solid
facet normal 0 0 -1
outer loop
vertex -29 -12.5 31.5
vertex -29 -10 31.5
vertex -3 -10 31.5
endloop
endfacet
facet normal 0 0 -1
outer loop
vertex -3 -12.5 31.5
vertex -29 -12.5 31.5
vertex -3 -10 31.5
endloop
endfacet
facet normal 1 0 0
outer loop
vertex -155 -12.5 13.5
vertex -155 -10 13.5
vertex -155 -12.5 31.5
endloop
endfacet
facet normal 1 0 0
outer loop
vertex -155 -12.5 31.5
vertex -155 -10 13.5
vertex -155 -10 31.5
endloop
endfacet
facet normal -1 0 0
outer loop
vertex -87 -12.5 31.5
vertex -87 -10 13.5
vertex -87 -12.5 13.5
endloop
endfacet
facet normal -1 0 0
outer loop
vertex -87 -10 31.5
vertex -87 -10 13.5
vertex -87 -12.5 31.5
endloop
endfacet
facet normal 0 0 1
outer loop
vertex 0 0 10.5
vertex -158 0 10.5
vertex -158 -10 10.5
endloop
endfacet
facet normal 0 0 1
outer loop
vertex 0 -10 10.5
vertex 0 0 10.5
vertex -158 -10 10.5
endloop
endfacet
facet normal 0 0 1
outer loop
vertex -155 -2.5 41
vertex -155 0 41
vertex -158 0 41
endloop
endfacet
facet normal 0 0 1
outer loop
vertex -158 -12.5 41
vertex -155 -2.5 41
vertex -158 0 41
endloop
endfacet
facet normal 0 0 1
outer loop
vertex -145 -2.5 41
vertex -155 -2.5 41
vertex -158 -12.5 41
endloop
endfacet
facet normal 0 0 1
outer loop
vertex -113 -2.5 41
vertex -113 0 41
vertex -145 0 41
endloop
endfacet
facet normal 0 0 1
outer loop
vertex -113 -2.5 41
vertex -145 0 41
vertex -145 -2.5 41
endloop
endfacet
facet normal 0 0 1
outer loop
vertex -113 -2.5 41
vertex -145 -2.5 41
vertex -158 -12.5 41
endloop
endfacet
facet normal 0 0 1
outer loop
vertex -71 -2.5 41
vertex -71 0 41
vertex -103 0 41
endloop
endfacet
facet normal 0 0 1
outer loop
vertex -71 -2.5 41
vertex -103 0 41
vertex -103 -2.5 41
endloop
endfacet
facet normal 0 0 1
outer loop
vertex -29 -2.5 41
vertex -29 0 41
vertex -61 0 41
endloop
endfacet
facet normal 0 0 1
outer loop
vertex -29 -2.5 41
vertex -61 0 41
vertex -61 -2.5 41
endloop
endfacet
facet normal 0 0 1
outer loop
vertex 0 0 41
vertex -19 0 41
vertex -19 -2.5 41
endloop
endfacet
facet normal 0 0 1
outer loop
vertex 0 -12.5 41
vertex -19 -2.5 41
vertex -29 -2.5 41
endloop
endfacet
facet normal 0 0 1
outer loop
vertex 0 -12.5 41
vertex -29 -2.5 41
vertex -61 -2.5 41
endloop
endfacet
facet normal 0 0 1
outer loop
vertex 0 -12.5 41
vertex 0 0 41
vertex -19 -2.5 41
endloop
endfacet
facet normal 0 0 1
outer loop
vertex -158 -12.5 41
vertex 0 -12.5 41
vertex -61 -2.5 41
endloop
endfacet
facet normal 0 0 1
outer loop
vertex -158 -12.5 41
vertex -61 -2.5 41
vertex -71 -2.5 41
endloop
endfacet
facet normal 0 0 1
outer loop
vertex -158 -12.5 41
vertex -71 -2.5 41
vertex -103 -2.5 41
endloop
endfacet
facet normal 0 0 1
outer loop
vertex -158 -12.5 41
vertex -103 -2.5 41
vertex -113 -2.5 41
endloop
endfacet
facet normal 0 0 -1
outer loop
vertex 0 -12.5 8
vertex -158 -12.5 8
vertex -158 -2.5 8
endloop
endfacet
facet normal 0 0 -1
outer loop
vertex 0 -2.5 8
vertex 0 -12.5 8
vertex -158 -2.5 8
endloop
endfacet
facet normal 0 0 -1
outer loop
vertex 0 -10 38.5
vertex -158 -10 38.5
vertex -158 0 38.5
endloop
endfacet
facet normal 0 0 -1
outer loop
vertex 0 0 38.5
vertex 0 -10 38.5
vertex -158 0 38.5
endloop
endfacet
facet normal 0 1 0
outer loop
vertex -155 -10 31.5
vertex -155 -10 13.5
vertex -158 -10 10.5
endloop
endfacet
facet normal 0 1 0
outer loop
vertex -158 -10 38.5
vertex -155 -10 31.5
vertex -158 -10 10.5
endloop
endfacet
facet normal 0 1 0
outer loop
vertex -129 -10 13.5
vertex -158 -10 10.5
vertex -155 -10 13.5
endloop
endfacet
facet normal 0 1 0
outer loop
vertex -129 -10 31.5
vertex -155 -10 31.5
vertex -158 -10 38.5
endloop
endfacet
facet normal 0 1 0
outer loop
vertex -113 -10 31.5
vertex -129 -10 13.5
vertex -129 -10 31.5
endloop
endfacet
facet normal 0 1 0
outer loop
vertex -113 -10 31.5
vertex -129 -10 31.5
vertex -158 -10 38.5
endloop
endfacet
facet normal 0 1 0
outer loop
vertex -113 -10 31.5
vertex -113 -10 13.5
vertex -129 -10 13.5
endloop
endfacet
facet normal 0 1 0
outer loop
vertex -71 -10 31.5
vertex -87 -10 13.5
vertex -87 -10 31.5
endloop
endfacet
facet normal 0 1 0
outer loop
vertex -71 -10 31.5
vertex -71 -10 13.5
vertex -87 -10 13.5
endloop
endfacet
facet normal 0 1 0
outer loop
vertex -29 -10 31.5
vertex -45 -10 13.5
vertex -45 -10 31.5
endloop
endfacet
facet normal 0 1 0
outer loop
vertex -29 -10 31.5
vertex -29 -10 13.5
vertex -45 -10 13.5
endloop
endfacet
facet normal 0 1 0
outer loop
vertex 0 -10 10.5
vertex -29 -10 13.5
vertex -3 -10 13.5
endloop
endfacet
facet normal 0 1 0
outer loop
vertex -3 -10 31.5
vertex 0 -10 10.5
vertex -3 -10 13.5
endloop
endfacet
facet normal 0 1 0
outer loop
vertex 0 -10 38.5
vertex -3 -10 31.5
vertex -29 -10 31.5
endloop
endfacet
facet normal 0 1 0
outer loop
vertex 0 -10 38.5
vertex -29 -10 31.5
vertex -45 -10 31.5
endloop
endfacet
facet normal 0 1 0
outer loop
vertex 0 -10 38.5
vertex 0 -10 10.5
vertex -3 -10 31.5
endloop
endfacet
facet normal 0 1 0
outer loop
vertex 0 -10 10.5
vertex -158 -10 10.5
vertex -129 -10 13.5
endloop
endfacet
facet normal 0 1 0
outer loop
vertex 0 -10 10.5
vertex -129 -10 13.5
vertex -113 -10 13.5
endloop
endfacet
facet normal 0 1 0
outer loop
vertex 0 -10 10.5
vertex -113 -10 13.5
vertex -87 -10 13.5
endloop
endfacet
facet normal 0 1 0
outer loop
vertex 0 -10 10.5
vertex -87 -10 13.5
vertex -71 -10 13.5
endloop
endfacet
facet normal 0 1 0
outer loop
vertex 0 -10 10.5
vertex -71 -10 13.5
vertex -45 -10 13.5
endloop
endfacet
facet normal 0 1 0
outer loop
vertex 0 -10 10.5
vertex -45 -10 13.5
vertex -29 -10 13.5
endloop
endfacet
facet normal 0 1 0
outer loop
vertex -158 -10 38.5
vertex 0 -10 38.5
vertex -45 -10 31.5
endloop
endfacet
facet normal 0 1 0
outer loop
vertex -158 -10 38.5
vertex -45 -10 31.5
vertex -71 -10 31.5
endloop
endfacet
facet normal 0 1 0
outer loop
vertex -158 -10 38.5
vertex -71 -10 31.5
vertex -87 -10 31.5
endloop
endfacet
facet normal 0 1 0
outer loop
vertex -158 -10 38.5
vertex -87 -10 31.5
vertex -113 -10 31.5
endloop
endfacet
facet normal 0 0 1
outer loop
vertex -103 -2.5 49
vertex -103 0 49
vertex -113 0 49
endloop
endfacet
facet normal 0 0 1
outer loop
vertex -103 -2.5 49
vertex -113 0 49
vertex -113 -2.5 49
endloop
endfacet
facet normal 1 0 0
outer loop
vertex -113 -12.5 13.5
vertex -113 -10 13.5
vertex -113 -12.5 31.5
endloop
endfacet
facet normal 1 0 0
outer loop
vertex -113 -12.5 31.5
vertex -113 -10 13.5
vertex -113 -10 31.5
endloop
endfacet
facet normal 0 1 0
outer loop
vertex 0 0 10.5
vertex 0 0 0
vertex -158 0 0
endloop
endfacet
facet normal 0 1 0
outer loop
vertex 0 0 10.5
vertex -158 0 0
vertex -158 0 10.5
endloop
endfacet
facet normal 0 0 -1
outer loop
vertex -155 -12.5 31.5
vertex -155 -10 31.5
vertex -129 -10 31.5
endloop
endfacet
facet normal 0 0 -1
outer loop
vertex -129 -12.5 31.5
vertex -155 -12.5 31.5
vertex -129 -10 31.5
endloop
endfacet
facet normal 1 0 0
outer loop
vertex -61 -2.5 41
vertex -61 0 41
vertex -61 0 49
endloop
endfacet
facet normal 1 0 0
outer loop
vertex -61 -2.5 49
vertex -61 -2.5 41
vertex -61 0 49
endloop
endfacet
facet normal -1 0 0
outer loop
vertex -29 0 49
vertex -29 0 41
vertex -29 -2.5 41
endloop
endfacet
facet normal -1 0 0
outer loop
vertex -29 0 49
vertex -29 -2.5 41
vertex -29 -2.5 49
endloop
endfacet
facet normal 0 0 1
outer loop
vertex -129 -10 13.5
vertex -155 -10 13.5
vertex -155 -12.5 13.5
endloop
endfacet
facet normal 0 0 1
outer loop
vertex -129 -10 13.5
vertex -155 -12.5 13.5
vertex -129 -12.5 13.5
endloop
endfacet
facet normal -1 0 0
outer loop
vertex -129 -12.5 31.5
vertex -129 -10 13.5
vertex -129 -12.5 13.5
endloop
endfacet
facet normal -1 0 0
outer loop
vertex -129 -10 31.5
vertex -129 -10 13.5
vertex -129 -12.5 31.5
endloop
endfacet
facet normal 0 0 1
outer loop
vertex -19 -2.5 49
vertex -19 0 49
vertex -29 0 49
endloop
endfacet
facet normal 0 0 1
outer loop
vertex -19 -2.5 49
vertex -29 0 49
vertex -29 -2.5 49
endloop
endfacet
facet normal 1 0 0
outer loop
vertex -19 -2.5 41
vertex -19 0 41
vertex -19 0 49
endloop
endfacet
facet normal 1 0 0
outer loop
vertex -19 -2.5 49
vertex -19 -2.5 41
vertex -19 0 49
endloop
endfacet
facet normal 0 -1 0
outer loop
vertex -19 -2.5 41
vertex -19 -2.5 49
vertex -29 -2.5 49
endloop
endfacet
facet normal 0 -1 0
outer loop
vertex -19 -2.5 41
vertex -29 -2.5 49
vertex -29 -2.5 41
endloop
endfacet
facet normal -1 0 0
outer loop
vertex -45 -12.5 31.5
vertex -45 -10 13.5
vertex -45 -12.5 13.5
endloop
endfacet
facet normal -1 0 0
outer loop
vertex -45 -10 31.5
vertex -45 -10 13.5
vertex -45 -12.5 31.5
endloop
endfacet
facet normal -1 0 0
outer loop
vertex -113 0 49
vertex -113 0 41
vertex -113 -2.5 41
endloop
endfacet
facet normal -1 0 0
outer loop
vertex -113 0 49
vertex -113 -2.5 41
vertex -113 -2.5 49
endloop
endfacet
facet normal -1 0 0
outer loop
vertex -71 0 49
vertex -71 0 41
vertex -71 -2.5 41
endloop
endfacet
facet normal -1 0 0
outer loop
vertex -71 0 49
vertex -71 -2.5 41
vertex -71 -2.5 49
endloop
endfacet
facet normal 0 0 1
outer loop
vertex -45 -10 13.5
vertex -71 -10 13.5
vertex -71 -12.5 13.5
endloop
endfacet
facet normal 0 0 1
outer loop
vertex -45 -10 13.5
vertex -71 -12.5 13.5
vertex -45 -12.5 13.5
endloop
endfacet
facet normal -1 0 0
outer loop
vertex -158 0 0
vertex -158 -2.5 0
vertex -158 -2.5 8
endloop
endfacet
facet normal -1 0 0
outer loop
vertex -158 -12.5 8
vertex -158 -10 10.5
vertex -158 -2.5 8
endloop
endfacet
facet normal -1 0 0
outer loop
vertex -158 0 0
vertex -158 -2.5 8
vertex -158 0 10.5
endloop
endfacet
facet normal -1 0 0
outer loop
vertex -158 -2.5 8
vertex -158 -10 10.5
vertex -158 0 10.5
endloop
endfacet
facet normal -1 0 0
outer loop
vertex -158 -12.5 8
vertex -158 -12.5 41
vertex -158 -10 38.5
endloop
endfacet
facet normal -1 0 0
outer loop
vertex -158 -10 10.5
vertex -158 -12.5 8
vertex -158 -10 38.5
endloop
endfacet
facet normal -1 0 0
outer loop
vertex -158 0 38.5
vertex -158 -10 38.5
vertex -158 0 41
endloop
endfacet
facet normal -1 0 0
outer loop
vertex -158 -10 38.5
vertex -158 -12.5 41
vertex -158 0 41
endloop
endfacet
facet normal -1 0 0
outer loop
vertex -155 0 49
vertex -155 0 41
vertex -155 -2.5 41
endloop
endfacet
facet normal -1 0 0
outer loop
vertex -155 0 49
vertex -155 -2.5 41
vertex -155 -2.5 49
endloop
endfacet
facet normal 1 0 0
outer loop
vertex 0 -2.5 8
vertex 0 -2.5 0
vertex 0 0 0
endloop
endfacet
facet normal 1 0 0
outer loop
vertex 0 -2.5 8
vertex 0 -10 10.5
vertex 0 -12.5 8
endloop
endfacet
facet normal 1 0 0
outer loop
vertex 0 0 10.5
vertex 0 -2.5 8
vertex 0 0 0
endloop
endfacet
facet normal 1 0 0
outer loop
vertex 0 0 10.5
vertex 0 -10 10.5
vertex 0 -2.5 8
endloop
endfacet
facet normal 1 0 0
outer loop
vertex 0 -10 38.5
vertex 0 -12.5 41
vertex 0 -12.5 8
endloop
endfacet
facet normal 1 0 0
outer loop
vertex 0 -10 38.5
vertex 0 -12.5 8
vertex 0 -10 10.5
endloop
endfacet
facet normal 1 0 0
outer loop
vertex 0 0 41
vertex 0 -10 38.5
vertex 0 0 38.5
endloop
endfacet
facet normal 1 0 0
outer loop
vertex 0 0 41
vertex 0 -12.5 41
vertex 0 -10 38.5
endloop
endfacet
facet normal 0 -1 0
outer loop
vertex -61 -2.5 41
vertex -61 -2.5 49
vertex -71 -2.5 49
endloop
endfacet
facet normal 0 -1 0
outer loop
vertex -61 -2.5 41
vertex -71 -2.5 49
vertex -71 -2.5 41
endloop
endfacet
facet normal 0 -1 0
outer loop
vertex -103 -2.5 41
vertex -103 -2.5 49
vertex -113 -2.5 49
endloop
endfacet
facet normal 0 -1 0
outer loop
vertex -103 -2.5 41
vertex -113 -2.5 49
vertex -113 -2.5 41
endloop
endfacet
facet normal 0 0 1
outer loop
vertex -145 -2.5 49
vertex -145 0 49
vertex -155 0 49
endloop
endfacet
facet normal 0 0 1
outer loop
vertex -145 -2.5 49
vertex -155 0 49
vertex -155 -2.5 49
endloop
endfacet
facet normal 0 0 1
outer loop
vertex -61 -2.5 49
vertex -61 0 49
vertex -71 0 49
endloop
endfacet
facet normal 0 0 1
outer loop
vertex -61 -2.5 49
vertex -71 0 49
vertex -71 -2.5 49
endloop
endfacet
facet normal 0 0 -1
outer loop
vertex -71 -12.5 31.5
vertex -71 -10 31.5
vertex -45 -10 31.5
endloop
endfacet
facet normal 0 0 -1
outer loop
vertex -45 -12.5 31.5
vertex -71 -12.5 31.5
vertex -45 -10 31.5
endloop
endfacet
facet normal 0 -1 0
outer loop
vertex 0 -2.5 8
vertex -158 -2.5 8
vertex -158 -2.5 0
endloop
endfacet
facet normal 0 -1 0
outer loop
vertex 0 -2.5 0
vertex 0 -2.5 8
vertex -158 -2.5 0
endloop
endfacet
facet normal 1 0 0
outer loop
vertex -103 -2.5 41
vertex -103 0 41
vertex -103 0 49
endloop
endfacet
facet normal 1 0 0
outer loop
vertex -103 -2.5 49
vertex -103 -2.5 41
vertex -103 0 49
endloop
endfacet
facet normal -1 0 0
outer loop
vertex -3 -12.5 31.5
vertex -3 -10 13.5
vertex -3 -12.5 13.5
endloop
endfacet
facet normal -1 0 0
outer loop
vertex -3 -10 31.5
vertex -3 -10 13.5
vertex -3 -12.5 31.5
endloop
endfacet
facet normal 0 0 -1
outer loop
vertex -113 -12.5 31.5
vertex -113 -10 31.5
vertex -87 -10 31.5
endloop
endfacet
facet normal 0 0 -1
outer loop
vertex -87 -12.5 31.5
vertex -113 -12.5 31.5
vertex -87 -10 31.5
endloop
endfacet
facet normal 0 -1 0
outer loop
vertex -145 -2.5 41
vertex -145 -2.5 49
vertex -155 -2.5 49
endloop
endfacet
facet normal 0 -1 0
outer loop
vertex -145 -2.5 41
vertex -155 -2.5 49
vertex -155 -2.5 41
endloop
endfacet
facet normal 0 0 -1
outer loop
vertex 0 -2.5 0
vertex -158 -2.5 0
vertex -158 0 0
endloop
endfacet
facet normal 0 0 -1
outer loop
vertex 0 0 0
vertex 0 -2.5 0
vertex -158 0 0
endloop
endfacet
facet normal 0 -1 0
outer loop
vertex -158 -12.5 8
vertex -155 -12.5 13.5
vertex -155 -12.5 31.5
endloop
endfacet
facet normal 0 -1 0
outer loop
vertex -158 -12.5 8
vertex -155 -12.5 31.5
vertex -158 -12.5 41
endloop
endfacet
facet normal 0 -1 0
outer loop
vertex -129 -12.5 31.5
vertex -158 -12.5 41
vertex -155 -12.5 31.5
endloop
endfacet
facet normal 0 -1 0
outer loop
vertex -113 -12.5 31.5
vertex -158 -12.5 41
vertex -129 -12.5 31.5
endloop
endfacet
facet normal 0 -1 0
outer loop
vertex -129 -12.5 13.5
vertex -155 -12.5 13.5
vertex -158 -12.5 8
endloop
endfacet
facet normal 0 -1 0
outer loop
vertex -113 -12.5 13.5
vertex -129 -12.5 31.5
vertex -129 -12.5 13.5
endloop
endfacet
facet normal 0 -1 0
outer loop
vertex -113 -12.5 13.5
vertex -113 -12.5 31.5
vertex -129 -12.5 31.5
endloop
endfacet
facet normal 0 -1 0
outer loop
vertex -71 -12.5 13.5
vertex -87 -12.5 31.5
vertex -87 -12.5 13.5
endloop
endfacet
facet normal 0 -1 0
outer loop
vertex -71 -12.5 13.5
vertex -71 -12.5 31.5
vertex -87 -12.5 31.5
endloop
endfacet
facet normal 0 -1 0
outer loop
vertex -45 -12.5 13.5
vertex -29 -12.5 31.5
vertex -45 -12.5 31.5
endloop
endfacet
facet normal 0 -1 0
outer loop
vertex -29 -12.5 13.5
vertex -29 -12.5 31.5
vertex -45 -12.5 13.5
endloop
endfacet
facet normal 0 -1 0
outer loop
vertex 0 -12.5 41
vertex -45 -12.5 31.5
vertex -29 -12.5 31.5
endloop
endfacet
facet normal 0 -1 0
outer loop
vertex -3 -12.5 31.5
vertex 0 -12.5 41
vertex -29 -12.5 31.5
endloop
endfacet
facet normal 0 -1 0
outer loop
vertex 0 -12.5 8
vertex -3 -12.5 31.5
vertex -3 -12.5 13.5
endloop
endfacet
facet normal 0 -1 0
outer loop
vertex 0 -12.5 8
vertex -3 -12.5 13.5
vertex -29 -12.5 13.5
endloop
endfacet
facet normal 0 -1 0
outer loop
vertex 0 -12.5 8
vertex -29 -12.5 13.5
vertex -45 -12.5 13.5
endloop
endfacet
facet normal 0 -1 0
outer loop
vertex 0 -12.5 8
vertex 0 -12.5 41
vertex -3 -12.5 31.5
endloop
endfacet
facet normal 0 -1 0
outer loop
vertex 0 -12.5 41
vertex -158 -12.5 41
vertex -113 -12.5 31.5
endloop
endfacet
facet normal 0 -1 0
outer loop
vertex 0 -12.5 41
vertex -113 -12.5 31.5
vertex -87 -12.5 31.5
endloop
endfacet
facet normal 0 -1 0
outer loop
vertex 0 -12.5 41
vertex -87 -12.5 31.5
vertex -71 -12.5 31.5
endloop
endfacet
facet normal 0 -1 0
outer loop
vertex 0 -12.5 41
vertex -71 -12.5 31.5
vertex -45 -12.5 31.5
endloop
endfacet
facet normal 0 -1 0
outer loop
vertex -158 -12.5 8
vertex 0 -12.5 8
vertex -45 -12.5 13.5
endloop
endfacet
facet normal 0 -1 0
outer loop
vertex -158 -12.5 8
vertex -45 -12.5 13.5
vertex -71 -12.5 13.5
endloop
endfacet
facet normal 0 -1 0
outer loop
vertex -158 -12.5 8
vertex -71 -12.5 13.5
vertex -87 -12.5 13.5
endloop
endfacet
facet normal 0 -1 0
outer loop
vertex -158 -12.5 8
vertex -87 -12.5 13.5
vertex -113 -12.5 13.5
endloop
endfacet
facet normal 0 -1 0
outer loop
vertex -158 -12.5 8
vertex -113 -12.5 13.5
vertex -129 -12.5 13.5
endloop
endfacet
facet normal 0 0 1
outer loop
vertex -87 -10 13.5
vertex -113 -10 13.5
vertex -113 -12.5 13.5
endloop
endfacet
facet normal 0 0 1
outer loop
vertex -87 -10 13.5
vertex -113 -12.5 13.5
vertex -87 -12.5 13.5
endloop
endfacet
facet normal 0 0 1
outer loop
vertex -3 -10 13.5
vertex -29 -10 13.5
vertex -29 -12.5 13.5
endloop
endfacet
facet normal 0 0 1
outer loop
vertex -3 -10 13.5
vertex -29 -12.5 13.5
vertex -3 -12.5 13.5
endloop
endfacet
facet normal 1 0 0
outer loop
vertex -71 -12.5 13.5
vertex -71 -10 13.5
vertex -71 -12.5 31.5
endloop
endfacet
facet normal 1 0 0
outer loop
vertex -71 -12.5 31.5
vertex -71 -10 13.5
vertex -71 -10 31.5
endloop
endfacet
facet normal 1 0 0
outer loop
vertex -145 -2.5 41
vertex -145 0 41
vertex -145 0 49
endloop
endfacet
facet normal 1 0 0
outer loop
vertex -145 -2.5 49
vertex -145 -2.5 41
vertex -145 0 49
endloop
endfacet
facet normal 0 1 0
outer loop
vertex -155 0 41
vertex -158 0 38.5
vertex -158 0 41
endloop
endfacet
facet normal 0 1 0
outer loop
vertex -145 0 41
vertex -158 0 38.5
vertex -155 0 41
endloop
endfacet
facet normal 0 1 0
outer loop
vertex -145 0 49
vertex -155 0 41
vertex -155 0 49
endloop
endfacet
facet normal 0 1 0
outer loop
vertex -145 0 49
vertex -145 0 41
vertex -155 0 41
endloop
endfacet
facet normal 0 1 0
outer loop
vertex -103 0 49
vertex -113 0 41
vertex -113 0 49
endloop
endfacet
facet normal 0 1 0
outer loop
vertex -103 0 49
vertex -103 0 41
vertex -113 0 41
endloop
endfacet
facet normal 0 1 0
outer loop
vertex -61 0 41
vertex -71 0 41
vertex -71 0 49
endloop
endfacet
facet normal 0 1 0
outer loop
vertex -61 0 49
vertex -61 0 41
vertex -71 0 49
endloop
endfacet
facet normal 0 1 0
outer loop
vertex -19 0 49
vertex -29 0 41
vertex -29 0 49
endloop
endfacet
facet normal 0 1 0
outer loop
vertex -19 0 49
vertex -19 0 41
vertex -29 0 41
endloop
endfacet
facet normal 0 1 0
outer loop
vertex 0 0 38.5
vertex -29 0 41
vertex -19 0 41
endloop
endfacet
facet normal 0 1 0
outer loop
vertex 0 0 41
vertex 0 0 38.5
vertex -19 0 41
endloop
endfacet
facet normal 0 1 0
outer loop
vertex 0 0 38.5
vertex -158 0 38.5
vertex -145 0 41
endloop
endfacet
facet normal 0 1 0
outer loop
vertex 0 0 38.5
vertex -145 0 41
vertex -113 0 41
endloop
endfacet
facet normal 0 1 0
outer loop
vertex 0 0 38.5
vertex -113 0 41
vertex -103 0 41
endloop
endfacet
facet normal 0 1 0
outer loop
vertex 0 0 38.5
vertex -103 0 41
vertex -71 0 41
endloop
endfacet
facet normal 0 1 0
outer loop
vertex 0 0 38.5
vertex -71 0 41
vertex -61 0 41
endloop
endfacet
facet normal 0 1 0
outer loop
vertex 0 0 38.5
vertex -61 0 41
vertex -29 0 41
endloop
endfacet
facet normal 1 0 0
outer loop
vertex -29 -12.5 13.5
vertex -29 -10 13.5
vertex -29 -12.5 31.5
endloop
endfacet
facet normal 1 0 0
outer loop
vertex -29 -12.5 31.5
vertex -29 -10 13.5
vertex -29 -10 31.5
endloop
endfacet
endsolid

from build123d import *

# Parameters (mm, degrees)
F1_DEPTH  = 116
F2_W      = 26
F2_H      = 18
F3_DEPTH  = 12.501
F4_W      = 19
F4_H      = 8
F4_W_2    = 32
F4_W_3    = 3
F5_DEPTH  = 12.501
F7_DEPTH  = 158
F8_W      = 26
F8_H      = 18
F9_DEPTH  = 12.501
F10_W     = 19
F10_H     = 8
F10_W_2   = 32
F10_W_3   = 3
F11_DEPTH = 12.501


with BuildPart() as f1:
    # F0 (on Right) → F1 (new body)
    with BuildSketch(Plane.YZ):
        Polygon((-2.5, 0), (0, 0), (0, 10.5), (-10, 10.5), (-10, 38.5), (0, 38.5), (0, 49), (-2.5, 49), (-2.5, 41), (-12.5, 41), (-12.5, 8), (-2.5, 8), align=None)
    extrude(amount=F1_DEPTH)

    # F2 (on Front) → F3 (cut, through all)
    with BuildSketch(Plane.XZ):
        with Locations((16, 22.5)):
            Rectangle(F2_W, F2_H)
        with Locations((58, 22.5)):
            Rectangle(F2_W, F2_H)
        with Locations((100, 22.5)):
            Rectangle(F2_W, F2_H)
    extrude(amount=F3_DEPTH, mode=Mode.SUBTRACT)

    # F4 (on Front) → F5 (cut, through all)
    with BuildSketch(Plane.XZ):
        with Locations((9.5, 4)):
            Rectangle(F4_W, F4_H)
        with Locations((45, 4)):
            Rectangle(F4_W_2, F4_H)
        with Locations((87, 4)):
            Rectangle(F4_W_2, F4_H)
        with Locations((114.5, 4)):
            Rectangle(F4_W_3, F4_H)
    extrude(amount=F5_DEPTH, mode=Mode.SUBTRACT)


with BuildPart() as f7:
    # F0 (on Right) → F7 (new body)
    with BuildSketch(Plane.YZ):
        Polygon((-2.5, 0), (0, 0), (0, 10.5), (-10, 10.5), (-10, 38.5), (0, 38.5), (0, 49), (-2.5, 49), (-2.5, 41), (-12.5, 41), (-12.5, 8), (-2.5, 8), align=None)
    extrude(amount=-F7_DEPTH)

    # F8 (on Front) → F9 (cut, through all)
    with BuildSketch(Plane.XZ):
        with Locations((-16, 22.5)):
            Rectangle(F8_W, F8_H)
        with Locations((-58, 22.5)):
            Rectangle(F8_W, F8_H)
        with Locations((-100, 22.5)):
            Rectangle(F8_W, F8_H)
        with Locations((-142, 22.5)):
            Rectangle(F8_W, F8_H)
    extrude(amount=F9_DEPTH, mode=Mode.SUBTRACT)

    # F10 (on Front) → F11 (cut, through all)
    with BuildSketch(Plane.XZ):
        with Locations((-9.5, 45)):
            Rectangle(F10_W, F10_H)
        with Locations((-45, 45)):
            Rectangle(F10_W_2, F10_H)
        with Locations((-87, 45)):
            Rectangle(F10_W_2, F10_H)
        with Locations((-129, 45)):
            Rectangle(F10_W_2, F10_H)
        with Locations((-156.5, 45)):
            Rectangle(F10_W_3, F10_H)
    extrude(amount=F11_DEPTH, mode=Mode.SUBTRACT)


solid = f7.part
